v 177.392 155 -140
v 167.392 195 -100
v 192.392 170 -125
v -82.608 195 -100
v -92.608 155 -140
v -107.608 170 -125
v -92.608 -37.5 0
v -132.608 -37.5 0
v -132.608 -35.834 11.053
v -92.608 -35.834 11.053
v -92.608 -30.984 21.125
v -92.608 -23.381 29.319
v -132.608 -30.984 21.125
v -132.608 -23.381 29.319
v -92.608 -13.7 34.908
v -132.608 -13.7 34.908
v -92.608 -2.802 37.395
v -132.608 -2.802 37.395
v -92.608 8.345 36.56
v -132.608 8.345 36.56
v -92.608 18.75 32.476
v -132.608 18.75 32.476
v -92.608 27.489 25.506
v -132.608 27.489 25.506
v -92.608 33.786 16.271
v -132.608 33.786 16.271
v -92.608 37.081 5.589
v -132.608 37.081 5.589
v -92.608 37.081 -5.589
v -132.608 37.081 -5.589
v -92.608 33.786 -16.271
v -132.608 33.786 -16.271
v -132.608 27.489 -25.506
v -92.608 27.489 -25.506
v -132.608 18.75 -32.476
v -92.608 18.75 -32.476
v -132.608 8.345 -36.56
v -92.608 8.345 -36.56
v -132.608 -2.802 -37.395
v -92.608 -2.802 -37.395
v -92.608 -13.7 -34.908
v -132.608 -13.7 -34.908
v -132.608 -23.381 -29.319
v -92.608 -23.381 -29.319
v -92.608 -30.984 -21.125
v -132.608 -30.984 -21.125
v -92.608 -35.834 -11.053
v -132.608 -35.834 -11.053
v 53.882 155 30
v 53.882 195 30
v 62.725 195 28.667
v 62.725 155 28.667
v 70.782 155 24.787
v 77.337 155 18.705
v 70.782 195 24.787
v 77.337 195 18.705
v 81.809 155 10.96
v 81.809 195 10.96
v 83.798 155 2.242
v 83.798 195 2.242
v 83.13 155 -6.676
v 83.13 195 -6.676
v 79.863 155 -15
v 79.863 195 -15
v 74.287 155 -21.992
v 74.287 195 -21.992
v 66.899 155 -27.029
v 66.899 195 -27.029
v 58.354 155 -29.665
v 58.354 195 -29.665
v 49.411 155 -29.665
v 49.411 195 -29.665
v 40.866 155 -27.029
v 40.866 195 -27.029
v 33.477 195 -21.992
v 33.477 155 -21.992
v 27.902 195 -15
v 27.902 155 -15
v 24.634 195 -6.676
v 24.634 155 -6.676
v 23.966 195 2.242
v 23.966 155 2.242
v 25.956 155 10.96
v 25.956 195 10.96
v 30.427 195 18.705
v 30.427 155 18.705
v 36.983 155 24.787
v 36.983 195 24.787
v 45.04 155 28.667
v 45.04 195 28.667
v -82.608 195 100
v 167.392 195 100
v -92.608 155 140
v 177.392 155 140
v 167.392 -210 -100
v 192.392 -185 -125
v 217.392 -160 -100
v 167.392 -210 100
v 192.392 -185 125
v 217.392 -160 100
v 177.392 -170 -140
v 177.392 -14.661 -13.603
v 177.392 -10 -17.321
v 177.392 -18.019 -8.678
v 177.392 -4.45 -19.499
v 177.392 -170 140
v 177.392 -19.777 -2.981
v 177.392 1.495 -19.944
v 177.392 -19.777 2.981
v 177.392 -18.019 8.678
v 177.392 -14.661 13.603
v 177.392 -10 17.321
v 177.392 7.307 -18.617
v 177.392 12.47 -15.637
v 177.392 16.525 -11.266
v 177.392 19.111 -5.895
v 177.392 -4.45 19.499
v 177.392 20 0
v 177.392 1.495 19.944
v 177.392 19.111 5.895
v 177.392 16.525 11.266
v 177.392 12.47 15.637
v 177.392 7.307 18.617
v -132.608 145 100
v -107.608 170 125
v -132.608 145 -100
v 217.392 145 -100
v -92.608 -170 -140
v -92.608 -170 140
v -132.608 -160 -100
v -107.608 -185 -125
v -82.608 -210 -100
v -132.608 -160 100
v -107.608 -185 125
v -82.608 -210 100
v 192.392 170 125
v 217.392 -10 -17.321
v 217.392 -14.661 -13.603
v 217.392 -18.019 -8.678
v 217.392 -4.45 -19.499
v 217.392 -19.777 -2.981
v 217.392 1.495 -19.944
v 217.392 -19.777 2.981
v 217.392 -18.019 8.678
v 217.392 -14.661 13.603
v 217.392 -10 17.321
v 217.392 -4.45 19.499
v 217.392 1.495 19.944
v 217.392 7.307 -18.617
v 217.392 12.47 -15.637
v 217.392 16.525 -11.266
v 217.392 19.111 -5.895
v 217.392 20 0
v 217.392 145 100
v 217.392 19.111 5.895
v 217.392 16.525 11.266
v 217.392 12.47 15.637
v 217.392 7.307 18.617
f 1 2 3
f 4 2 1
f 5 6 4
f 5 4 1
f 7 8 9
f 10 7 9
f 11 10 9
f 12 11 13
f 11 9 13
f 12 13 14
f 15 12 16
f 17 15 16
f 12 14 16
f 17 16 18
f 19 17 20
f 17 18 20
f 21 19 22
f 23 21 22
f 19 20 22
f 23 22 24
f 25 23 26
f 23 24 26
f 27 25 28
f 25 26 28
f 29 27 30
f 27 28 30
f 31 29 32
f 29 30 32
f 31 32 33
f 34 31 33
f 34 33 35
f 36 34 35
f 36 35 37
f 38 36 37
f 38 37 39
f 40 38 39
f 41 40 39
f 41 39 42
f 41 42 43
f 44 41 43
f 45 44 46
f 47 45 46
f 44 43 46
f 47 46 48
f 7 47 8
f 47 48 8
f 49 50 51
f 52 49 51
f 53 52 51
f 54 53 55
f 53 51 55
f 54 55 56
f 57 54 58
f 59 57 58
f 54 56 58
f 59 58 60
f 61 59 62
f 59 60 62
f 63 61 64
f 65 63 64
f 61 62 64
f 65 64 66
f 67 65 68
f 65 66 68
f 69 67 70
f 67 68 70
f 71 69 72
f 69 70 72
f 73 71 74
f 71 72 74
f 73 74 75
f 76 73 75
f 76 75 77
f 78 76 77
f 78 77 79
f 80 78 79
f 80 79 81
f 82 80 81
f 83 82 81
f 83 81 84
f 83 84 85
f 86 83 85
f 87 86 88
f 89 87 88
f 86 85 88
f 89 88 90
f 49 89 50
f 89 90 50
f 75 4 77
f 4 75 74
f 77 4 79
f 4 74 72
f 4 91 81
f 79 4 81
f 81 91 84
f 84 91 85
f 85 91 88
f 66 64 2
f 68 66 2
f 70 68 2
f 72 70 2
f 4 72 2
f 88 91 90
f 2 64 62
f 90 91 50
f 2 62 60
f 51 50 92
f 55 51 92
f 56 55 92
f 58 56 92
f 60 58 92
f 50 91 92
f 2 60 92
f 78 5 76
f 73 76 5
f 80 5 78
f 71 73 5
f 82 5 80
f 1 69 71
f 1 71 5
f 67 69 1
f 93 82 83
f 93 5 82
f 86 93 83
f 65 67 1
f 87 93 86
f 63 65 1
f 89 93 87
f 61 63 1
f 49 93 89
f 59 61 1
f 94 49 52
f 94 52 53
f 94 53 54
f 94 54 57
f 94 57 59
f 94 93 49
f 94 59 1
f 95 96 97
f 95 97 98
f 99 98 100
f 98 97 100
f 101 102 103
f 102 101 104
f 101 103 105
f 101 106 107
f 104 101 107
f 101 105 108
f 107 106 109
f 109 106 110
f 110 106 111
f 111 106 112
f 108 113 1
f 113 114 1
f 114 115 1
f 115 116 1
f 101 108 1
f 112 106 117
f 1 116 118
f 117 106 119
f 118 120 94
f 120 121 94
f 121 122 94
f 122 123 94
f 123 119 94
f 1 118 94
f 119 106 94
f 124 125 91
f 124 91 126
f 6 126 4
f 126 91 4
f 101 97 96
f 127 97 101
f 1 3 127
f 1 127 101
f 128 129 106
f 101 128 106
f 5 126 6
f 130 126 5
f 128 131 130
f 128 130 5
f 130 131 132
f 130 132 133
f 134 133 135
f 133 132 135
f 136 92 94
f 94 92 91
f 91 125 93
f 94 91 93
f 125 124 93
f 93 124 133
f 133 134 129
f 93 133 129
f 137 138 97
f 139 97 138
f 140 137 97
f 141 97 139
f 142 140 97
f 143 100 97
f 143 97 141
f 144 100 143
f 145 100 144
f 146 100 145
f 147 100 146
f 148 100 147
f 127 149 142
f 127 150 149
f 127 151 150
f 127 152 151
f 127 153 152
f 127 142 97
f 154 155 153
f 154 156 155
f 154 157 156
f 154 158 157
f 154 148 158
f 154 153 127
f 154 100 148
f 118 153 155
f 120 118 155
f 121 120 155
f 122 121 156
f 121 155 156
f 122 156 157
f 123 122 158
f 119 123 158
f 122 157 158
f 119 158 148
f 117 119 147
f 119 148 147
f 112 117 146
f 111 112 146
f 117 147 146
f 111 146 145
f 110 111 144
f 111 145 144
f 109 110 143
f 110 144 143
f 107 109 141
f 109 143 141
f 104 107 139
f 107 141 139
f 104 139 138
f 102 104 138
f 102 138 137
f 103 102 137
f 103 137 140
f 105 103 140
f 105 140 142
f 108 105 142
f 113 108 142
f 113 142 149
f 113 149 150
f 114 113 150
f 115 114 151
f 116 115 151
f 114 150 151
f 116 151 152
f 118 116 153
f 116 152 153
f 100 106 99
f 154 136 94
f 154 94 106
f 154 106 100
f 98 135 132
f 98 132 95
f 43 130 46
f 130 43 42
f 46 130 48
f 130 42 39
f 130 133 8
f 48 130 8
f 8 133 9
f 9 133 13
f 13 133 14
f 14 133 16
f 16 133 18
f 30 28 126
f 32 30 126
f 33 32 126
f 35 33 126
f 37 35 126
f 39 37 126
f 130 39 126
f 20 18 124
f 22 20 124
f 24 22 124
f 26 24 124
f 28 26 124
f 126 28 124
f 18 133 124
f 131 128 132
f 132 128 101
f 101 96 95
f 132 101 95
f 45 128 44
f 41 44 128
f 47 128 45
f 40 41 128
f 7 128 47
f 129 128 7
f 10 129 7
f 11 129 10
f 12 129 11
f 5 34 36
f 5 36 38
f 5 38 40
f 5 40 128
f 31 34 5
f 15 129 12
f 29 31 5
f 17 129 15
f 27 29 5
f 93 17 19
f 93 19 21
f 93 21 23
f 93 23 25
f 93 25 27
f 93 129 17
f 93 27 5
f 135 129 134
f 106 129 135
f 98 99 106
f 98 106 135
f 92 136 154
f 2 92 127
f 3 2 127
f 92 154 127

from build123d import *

# Parameters (mm, degrees)
SKETCH1_W           = 350
SKETCH1_H           = 405
SKETCH1_W_2         = 270
SKETCH1_H_2         = 325
BOSS_EXTRUDE1_DEPTH = 150
SKETCH2_R           = 37.5
CUT_EXTRUDE1_DEPTH  = 40
SKETCH3_R           = 20
CUT_EXTRUDE2_DEPTH  = 40
SKETCH4_R           = 30
CUT_EXTRUDE3_DEPTH  = 40
CHAMFER1_SIZE       = 50
CHAMFER2_SIZE       = 50
CHAMFER3_SIZE       = 50


with BuildPart() as part:
    # Sketch1 → Boss-Extrude1 (new, symmetric)
    with BuildSketch(Plane.XY):
        with Locations((42.392307941, -7.5)):
            Rectangle(SKETCH1_W, SKETCH1_H)
        with Locations((42.392307941, -7.5)):
            Rectangle(SKETCH1_W_2, SKETCH1_H_2, mode=Mode.SUBTRACT)
    extrude(amount=BOSS_EXTRUDE1_DEPTH, both=True)

    # Sketch2 → Cut-Extrude1 (cut)
    with BuildSketch(Plane.ZY.offset(132.607692059)):
        with Locations(Location((0, 0, 0), (0, 0, 270))):
            Circle(SKETCH2_R)
    extrude(amount=-CUT_EXTRUDE1_DEPTH, mode=Mode.SUBTRACT)

    # Sketch3 → Cut-Extrude2 (cut)
    with BuildSketch(Plane(origin=(217.392307941, 0, 0), x_dir=(0, 0, -1), z_dir=(1, 0, 0))):
        with Locations(Location((0, 0, 0), (0, 0, 90))):
            Circle(SKETCH3_R)
    extrude(amount=-CUT_EXTRUDE2_DEPTH, mode=Mode.SUBTRACT)

    # Sketch4 → Cut-Extrude3 (cut)
    with BuildSketch(Plane(origin=(0, 195, 0), x_dir=(1, 0, 0), z_dir=(0, 1, 0))):
        with Locations(Location((53.882307941, 0, 0), (0, 0, 270))):
            Circle(SKETCH4_R)
    extrude(amount=-CUT_EXTRUDE3_DEPTH, mode=Mode.SUBTRACT)

    # Chamfer1
    chamfer1_edges = [part.edges().sort_by_distance(p)[0] for p in [
        (-132.607692059, 195, 0),
        (217.392307941, 195, 0),
        (217.392307941, -210, 0),
        (-132.607692059, -210, 0),
    ]]
    chamfer(chamfer1_edges, length=CHAMFER1_SIZE)

    # Chamfer2
    # the kernel refuses this chamfer: 50 mm, written as the material it takes off along each edge
    with BuildSketch(Plane(origin=(295.97645734, -210, -150), x_dir=(0, 0.9996219169112966, -0.027495876610586587), z_dir=(-1, 0, 0)), Plane(origin=(-211.191841457, 195, 150), x_dir=(0, 0.027495876610586594, -0.9996219169112966), z_dir=(1, 0, 0))) as chamfer2_piece_1:
        Polygon((CHAMFER2_SIZE * 0.999621916911, -CHAMFER2_SIZE * 0.0274958766106), (-CHAMFER2_SIZE * 0.0274958766106, -CHAMFER2_SIZE * 0.999621916911), (0, 0), align=None)
    extrude(amount=507.168298797, mode=Mode.SUBTRACT)
    with BuildSketch(Plane(origin=(-211.191841457, 195, -150), x_dir=(0, 0.027495876610586594, 0.9996219169112966), z_dir=(1, 0, 0)), Plane(origin=(295.97645734, -210, 150), x_dir=(0, 0.9996219169112966, 0.027495876610586587), z_dir=(-1, 0, 0))) as chamfer2_piece_2:
        Polygon((CHAMFER2_SIZE * 0.999621916911, CHAMFER2_SIZE * 0.0274958766106), (-CHAMFER2_SIZE * 0.0274958766106, CHAMFER2_SIZE * 0.999621916911), (0, 0), align=None)
    extrude(amount=507.168298797, mode=Mode.SUBTRACT)

    # Chamfer3
    # the kernel refuses this chamfer: 50 mm, written as the material it takes off along each edge
    with BuildSketch(Plane(origin=(217.392307941, 273.584149398, 150), x_dir=(-0.9996219169112966, 0, 0.027495876610586587), z_dir=(0, -1, 0)), Plane(origin=(-132.607692059, -288.584149398, -150), x_dir=(-0.027495876610586594, 0, 0.9996219169112966), z_dir=(0, 1, 0)), Plane(origin=(217.392307941, 273.584149398, -150), x_dir=(0.027495876610586594, 0, 0.9996219169112966), z_dir=(0, -1, 0))) as chamfer3_piece_1:
        Polygon((CHAMFER3_SIZE * 0.999621916911, CHAMFER3_SIZE * 0.0274958766106), (-CHAMFER3_SIZE * 0.0274958766106, CHAMFER3_SIZE * 0.999621916911), (0, 0), align=None)
    extrude(amount=562.168298797, mode=Mode.SUBTRACT)
    with BuildSketch(Plane(origin=(-132.607692059, -288.584149398, 150), x_dir=(-0.027495876610586594, 0, -0.9996219169112966), z_dir=(0, 1, 0))) as chamfer3_piece_2:
        Polygon((CHAMFER3_SIZE * 0.999621916911, -CHAMFER3_SIZE * 0.0274958766106), (-CHAMFER3_SIZE * 0.0274958766106, -CHAMFER3_SIZE * 0.999621916911), (0, 0), align=None)
    extrude(amount=562.168298797, mode=Mode.SUBTRACT)


solid = part.part
